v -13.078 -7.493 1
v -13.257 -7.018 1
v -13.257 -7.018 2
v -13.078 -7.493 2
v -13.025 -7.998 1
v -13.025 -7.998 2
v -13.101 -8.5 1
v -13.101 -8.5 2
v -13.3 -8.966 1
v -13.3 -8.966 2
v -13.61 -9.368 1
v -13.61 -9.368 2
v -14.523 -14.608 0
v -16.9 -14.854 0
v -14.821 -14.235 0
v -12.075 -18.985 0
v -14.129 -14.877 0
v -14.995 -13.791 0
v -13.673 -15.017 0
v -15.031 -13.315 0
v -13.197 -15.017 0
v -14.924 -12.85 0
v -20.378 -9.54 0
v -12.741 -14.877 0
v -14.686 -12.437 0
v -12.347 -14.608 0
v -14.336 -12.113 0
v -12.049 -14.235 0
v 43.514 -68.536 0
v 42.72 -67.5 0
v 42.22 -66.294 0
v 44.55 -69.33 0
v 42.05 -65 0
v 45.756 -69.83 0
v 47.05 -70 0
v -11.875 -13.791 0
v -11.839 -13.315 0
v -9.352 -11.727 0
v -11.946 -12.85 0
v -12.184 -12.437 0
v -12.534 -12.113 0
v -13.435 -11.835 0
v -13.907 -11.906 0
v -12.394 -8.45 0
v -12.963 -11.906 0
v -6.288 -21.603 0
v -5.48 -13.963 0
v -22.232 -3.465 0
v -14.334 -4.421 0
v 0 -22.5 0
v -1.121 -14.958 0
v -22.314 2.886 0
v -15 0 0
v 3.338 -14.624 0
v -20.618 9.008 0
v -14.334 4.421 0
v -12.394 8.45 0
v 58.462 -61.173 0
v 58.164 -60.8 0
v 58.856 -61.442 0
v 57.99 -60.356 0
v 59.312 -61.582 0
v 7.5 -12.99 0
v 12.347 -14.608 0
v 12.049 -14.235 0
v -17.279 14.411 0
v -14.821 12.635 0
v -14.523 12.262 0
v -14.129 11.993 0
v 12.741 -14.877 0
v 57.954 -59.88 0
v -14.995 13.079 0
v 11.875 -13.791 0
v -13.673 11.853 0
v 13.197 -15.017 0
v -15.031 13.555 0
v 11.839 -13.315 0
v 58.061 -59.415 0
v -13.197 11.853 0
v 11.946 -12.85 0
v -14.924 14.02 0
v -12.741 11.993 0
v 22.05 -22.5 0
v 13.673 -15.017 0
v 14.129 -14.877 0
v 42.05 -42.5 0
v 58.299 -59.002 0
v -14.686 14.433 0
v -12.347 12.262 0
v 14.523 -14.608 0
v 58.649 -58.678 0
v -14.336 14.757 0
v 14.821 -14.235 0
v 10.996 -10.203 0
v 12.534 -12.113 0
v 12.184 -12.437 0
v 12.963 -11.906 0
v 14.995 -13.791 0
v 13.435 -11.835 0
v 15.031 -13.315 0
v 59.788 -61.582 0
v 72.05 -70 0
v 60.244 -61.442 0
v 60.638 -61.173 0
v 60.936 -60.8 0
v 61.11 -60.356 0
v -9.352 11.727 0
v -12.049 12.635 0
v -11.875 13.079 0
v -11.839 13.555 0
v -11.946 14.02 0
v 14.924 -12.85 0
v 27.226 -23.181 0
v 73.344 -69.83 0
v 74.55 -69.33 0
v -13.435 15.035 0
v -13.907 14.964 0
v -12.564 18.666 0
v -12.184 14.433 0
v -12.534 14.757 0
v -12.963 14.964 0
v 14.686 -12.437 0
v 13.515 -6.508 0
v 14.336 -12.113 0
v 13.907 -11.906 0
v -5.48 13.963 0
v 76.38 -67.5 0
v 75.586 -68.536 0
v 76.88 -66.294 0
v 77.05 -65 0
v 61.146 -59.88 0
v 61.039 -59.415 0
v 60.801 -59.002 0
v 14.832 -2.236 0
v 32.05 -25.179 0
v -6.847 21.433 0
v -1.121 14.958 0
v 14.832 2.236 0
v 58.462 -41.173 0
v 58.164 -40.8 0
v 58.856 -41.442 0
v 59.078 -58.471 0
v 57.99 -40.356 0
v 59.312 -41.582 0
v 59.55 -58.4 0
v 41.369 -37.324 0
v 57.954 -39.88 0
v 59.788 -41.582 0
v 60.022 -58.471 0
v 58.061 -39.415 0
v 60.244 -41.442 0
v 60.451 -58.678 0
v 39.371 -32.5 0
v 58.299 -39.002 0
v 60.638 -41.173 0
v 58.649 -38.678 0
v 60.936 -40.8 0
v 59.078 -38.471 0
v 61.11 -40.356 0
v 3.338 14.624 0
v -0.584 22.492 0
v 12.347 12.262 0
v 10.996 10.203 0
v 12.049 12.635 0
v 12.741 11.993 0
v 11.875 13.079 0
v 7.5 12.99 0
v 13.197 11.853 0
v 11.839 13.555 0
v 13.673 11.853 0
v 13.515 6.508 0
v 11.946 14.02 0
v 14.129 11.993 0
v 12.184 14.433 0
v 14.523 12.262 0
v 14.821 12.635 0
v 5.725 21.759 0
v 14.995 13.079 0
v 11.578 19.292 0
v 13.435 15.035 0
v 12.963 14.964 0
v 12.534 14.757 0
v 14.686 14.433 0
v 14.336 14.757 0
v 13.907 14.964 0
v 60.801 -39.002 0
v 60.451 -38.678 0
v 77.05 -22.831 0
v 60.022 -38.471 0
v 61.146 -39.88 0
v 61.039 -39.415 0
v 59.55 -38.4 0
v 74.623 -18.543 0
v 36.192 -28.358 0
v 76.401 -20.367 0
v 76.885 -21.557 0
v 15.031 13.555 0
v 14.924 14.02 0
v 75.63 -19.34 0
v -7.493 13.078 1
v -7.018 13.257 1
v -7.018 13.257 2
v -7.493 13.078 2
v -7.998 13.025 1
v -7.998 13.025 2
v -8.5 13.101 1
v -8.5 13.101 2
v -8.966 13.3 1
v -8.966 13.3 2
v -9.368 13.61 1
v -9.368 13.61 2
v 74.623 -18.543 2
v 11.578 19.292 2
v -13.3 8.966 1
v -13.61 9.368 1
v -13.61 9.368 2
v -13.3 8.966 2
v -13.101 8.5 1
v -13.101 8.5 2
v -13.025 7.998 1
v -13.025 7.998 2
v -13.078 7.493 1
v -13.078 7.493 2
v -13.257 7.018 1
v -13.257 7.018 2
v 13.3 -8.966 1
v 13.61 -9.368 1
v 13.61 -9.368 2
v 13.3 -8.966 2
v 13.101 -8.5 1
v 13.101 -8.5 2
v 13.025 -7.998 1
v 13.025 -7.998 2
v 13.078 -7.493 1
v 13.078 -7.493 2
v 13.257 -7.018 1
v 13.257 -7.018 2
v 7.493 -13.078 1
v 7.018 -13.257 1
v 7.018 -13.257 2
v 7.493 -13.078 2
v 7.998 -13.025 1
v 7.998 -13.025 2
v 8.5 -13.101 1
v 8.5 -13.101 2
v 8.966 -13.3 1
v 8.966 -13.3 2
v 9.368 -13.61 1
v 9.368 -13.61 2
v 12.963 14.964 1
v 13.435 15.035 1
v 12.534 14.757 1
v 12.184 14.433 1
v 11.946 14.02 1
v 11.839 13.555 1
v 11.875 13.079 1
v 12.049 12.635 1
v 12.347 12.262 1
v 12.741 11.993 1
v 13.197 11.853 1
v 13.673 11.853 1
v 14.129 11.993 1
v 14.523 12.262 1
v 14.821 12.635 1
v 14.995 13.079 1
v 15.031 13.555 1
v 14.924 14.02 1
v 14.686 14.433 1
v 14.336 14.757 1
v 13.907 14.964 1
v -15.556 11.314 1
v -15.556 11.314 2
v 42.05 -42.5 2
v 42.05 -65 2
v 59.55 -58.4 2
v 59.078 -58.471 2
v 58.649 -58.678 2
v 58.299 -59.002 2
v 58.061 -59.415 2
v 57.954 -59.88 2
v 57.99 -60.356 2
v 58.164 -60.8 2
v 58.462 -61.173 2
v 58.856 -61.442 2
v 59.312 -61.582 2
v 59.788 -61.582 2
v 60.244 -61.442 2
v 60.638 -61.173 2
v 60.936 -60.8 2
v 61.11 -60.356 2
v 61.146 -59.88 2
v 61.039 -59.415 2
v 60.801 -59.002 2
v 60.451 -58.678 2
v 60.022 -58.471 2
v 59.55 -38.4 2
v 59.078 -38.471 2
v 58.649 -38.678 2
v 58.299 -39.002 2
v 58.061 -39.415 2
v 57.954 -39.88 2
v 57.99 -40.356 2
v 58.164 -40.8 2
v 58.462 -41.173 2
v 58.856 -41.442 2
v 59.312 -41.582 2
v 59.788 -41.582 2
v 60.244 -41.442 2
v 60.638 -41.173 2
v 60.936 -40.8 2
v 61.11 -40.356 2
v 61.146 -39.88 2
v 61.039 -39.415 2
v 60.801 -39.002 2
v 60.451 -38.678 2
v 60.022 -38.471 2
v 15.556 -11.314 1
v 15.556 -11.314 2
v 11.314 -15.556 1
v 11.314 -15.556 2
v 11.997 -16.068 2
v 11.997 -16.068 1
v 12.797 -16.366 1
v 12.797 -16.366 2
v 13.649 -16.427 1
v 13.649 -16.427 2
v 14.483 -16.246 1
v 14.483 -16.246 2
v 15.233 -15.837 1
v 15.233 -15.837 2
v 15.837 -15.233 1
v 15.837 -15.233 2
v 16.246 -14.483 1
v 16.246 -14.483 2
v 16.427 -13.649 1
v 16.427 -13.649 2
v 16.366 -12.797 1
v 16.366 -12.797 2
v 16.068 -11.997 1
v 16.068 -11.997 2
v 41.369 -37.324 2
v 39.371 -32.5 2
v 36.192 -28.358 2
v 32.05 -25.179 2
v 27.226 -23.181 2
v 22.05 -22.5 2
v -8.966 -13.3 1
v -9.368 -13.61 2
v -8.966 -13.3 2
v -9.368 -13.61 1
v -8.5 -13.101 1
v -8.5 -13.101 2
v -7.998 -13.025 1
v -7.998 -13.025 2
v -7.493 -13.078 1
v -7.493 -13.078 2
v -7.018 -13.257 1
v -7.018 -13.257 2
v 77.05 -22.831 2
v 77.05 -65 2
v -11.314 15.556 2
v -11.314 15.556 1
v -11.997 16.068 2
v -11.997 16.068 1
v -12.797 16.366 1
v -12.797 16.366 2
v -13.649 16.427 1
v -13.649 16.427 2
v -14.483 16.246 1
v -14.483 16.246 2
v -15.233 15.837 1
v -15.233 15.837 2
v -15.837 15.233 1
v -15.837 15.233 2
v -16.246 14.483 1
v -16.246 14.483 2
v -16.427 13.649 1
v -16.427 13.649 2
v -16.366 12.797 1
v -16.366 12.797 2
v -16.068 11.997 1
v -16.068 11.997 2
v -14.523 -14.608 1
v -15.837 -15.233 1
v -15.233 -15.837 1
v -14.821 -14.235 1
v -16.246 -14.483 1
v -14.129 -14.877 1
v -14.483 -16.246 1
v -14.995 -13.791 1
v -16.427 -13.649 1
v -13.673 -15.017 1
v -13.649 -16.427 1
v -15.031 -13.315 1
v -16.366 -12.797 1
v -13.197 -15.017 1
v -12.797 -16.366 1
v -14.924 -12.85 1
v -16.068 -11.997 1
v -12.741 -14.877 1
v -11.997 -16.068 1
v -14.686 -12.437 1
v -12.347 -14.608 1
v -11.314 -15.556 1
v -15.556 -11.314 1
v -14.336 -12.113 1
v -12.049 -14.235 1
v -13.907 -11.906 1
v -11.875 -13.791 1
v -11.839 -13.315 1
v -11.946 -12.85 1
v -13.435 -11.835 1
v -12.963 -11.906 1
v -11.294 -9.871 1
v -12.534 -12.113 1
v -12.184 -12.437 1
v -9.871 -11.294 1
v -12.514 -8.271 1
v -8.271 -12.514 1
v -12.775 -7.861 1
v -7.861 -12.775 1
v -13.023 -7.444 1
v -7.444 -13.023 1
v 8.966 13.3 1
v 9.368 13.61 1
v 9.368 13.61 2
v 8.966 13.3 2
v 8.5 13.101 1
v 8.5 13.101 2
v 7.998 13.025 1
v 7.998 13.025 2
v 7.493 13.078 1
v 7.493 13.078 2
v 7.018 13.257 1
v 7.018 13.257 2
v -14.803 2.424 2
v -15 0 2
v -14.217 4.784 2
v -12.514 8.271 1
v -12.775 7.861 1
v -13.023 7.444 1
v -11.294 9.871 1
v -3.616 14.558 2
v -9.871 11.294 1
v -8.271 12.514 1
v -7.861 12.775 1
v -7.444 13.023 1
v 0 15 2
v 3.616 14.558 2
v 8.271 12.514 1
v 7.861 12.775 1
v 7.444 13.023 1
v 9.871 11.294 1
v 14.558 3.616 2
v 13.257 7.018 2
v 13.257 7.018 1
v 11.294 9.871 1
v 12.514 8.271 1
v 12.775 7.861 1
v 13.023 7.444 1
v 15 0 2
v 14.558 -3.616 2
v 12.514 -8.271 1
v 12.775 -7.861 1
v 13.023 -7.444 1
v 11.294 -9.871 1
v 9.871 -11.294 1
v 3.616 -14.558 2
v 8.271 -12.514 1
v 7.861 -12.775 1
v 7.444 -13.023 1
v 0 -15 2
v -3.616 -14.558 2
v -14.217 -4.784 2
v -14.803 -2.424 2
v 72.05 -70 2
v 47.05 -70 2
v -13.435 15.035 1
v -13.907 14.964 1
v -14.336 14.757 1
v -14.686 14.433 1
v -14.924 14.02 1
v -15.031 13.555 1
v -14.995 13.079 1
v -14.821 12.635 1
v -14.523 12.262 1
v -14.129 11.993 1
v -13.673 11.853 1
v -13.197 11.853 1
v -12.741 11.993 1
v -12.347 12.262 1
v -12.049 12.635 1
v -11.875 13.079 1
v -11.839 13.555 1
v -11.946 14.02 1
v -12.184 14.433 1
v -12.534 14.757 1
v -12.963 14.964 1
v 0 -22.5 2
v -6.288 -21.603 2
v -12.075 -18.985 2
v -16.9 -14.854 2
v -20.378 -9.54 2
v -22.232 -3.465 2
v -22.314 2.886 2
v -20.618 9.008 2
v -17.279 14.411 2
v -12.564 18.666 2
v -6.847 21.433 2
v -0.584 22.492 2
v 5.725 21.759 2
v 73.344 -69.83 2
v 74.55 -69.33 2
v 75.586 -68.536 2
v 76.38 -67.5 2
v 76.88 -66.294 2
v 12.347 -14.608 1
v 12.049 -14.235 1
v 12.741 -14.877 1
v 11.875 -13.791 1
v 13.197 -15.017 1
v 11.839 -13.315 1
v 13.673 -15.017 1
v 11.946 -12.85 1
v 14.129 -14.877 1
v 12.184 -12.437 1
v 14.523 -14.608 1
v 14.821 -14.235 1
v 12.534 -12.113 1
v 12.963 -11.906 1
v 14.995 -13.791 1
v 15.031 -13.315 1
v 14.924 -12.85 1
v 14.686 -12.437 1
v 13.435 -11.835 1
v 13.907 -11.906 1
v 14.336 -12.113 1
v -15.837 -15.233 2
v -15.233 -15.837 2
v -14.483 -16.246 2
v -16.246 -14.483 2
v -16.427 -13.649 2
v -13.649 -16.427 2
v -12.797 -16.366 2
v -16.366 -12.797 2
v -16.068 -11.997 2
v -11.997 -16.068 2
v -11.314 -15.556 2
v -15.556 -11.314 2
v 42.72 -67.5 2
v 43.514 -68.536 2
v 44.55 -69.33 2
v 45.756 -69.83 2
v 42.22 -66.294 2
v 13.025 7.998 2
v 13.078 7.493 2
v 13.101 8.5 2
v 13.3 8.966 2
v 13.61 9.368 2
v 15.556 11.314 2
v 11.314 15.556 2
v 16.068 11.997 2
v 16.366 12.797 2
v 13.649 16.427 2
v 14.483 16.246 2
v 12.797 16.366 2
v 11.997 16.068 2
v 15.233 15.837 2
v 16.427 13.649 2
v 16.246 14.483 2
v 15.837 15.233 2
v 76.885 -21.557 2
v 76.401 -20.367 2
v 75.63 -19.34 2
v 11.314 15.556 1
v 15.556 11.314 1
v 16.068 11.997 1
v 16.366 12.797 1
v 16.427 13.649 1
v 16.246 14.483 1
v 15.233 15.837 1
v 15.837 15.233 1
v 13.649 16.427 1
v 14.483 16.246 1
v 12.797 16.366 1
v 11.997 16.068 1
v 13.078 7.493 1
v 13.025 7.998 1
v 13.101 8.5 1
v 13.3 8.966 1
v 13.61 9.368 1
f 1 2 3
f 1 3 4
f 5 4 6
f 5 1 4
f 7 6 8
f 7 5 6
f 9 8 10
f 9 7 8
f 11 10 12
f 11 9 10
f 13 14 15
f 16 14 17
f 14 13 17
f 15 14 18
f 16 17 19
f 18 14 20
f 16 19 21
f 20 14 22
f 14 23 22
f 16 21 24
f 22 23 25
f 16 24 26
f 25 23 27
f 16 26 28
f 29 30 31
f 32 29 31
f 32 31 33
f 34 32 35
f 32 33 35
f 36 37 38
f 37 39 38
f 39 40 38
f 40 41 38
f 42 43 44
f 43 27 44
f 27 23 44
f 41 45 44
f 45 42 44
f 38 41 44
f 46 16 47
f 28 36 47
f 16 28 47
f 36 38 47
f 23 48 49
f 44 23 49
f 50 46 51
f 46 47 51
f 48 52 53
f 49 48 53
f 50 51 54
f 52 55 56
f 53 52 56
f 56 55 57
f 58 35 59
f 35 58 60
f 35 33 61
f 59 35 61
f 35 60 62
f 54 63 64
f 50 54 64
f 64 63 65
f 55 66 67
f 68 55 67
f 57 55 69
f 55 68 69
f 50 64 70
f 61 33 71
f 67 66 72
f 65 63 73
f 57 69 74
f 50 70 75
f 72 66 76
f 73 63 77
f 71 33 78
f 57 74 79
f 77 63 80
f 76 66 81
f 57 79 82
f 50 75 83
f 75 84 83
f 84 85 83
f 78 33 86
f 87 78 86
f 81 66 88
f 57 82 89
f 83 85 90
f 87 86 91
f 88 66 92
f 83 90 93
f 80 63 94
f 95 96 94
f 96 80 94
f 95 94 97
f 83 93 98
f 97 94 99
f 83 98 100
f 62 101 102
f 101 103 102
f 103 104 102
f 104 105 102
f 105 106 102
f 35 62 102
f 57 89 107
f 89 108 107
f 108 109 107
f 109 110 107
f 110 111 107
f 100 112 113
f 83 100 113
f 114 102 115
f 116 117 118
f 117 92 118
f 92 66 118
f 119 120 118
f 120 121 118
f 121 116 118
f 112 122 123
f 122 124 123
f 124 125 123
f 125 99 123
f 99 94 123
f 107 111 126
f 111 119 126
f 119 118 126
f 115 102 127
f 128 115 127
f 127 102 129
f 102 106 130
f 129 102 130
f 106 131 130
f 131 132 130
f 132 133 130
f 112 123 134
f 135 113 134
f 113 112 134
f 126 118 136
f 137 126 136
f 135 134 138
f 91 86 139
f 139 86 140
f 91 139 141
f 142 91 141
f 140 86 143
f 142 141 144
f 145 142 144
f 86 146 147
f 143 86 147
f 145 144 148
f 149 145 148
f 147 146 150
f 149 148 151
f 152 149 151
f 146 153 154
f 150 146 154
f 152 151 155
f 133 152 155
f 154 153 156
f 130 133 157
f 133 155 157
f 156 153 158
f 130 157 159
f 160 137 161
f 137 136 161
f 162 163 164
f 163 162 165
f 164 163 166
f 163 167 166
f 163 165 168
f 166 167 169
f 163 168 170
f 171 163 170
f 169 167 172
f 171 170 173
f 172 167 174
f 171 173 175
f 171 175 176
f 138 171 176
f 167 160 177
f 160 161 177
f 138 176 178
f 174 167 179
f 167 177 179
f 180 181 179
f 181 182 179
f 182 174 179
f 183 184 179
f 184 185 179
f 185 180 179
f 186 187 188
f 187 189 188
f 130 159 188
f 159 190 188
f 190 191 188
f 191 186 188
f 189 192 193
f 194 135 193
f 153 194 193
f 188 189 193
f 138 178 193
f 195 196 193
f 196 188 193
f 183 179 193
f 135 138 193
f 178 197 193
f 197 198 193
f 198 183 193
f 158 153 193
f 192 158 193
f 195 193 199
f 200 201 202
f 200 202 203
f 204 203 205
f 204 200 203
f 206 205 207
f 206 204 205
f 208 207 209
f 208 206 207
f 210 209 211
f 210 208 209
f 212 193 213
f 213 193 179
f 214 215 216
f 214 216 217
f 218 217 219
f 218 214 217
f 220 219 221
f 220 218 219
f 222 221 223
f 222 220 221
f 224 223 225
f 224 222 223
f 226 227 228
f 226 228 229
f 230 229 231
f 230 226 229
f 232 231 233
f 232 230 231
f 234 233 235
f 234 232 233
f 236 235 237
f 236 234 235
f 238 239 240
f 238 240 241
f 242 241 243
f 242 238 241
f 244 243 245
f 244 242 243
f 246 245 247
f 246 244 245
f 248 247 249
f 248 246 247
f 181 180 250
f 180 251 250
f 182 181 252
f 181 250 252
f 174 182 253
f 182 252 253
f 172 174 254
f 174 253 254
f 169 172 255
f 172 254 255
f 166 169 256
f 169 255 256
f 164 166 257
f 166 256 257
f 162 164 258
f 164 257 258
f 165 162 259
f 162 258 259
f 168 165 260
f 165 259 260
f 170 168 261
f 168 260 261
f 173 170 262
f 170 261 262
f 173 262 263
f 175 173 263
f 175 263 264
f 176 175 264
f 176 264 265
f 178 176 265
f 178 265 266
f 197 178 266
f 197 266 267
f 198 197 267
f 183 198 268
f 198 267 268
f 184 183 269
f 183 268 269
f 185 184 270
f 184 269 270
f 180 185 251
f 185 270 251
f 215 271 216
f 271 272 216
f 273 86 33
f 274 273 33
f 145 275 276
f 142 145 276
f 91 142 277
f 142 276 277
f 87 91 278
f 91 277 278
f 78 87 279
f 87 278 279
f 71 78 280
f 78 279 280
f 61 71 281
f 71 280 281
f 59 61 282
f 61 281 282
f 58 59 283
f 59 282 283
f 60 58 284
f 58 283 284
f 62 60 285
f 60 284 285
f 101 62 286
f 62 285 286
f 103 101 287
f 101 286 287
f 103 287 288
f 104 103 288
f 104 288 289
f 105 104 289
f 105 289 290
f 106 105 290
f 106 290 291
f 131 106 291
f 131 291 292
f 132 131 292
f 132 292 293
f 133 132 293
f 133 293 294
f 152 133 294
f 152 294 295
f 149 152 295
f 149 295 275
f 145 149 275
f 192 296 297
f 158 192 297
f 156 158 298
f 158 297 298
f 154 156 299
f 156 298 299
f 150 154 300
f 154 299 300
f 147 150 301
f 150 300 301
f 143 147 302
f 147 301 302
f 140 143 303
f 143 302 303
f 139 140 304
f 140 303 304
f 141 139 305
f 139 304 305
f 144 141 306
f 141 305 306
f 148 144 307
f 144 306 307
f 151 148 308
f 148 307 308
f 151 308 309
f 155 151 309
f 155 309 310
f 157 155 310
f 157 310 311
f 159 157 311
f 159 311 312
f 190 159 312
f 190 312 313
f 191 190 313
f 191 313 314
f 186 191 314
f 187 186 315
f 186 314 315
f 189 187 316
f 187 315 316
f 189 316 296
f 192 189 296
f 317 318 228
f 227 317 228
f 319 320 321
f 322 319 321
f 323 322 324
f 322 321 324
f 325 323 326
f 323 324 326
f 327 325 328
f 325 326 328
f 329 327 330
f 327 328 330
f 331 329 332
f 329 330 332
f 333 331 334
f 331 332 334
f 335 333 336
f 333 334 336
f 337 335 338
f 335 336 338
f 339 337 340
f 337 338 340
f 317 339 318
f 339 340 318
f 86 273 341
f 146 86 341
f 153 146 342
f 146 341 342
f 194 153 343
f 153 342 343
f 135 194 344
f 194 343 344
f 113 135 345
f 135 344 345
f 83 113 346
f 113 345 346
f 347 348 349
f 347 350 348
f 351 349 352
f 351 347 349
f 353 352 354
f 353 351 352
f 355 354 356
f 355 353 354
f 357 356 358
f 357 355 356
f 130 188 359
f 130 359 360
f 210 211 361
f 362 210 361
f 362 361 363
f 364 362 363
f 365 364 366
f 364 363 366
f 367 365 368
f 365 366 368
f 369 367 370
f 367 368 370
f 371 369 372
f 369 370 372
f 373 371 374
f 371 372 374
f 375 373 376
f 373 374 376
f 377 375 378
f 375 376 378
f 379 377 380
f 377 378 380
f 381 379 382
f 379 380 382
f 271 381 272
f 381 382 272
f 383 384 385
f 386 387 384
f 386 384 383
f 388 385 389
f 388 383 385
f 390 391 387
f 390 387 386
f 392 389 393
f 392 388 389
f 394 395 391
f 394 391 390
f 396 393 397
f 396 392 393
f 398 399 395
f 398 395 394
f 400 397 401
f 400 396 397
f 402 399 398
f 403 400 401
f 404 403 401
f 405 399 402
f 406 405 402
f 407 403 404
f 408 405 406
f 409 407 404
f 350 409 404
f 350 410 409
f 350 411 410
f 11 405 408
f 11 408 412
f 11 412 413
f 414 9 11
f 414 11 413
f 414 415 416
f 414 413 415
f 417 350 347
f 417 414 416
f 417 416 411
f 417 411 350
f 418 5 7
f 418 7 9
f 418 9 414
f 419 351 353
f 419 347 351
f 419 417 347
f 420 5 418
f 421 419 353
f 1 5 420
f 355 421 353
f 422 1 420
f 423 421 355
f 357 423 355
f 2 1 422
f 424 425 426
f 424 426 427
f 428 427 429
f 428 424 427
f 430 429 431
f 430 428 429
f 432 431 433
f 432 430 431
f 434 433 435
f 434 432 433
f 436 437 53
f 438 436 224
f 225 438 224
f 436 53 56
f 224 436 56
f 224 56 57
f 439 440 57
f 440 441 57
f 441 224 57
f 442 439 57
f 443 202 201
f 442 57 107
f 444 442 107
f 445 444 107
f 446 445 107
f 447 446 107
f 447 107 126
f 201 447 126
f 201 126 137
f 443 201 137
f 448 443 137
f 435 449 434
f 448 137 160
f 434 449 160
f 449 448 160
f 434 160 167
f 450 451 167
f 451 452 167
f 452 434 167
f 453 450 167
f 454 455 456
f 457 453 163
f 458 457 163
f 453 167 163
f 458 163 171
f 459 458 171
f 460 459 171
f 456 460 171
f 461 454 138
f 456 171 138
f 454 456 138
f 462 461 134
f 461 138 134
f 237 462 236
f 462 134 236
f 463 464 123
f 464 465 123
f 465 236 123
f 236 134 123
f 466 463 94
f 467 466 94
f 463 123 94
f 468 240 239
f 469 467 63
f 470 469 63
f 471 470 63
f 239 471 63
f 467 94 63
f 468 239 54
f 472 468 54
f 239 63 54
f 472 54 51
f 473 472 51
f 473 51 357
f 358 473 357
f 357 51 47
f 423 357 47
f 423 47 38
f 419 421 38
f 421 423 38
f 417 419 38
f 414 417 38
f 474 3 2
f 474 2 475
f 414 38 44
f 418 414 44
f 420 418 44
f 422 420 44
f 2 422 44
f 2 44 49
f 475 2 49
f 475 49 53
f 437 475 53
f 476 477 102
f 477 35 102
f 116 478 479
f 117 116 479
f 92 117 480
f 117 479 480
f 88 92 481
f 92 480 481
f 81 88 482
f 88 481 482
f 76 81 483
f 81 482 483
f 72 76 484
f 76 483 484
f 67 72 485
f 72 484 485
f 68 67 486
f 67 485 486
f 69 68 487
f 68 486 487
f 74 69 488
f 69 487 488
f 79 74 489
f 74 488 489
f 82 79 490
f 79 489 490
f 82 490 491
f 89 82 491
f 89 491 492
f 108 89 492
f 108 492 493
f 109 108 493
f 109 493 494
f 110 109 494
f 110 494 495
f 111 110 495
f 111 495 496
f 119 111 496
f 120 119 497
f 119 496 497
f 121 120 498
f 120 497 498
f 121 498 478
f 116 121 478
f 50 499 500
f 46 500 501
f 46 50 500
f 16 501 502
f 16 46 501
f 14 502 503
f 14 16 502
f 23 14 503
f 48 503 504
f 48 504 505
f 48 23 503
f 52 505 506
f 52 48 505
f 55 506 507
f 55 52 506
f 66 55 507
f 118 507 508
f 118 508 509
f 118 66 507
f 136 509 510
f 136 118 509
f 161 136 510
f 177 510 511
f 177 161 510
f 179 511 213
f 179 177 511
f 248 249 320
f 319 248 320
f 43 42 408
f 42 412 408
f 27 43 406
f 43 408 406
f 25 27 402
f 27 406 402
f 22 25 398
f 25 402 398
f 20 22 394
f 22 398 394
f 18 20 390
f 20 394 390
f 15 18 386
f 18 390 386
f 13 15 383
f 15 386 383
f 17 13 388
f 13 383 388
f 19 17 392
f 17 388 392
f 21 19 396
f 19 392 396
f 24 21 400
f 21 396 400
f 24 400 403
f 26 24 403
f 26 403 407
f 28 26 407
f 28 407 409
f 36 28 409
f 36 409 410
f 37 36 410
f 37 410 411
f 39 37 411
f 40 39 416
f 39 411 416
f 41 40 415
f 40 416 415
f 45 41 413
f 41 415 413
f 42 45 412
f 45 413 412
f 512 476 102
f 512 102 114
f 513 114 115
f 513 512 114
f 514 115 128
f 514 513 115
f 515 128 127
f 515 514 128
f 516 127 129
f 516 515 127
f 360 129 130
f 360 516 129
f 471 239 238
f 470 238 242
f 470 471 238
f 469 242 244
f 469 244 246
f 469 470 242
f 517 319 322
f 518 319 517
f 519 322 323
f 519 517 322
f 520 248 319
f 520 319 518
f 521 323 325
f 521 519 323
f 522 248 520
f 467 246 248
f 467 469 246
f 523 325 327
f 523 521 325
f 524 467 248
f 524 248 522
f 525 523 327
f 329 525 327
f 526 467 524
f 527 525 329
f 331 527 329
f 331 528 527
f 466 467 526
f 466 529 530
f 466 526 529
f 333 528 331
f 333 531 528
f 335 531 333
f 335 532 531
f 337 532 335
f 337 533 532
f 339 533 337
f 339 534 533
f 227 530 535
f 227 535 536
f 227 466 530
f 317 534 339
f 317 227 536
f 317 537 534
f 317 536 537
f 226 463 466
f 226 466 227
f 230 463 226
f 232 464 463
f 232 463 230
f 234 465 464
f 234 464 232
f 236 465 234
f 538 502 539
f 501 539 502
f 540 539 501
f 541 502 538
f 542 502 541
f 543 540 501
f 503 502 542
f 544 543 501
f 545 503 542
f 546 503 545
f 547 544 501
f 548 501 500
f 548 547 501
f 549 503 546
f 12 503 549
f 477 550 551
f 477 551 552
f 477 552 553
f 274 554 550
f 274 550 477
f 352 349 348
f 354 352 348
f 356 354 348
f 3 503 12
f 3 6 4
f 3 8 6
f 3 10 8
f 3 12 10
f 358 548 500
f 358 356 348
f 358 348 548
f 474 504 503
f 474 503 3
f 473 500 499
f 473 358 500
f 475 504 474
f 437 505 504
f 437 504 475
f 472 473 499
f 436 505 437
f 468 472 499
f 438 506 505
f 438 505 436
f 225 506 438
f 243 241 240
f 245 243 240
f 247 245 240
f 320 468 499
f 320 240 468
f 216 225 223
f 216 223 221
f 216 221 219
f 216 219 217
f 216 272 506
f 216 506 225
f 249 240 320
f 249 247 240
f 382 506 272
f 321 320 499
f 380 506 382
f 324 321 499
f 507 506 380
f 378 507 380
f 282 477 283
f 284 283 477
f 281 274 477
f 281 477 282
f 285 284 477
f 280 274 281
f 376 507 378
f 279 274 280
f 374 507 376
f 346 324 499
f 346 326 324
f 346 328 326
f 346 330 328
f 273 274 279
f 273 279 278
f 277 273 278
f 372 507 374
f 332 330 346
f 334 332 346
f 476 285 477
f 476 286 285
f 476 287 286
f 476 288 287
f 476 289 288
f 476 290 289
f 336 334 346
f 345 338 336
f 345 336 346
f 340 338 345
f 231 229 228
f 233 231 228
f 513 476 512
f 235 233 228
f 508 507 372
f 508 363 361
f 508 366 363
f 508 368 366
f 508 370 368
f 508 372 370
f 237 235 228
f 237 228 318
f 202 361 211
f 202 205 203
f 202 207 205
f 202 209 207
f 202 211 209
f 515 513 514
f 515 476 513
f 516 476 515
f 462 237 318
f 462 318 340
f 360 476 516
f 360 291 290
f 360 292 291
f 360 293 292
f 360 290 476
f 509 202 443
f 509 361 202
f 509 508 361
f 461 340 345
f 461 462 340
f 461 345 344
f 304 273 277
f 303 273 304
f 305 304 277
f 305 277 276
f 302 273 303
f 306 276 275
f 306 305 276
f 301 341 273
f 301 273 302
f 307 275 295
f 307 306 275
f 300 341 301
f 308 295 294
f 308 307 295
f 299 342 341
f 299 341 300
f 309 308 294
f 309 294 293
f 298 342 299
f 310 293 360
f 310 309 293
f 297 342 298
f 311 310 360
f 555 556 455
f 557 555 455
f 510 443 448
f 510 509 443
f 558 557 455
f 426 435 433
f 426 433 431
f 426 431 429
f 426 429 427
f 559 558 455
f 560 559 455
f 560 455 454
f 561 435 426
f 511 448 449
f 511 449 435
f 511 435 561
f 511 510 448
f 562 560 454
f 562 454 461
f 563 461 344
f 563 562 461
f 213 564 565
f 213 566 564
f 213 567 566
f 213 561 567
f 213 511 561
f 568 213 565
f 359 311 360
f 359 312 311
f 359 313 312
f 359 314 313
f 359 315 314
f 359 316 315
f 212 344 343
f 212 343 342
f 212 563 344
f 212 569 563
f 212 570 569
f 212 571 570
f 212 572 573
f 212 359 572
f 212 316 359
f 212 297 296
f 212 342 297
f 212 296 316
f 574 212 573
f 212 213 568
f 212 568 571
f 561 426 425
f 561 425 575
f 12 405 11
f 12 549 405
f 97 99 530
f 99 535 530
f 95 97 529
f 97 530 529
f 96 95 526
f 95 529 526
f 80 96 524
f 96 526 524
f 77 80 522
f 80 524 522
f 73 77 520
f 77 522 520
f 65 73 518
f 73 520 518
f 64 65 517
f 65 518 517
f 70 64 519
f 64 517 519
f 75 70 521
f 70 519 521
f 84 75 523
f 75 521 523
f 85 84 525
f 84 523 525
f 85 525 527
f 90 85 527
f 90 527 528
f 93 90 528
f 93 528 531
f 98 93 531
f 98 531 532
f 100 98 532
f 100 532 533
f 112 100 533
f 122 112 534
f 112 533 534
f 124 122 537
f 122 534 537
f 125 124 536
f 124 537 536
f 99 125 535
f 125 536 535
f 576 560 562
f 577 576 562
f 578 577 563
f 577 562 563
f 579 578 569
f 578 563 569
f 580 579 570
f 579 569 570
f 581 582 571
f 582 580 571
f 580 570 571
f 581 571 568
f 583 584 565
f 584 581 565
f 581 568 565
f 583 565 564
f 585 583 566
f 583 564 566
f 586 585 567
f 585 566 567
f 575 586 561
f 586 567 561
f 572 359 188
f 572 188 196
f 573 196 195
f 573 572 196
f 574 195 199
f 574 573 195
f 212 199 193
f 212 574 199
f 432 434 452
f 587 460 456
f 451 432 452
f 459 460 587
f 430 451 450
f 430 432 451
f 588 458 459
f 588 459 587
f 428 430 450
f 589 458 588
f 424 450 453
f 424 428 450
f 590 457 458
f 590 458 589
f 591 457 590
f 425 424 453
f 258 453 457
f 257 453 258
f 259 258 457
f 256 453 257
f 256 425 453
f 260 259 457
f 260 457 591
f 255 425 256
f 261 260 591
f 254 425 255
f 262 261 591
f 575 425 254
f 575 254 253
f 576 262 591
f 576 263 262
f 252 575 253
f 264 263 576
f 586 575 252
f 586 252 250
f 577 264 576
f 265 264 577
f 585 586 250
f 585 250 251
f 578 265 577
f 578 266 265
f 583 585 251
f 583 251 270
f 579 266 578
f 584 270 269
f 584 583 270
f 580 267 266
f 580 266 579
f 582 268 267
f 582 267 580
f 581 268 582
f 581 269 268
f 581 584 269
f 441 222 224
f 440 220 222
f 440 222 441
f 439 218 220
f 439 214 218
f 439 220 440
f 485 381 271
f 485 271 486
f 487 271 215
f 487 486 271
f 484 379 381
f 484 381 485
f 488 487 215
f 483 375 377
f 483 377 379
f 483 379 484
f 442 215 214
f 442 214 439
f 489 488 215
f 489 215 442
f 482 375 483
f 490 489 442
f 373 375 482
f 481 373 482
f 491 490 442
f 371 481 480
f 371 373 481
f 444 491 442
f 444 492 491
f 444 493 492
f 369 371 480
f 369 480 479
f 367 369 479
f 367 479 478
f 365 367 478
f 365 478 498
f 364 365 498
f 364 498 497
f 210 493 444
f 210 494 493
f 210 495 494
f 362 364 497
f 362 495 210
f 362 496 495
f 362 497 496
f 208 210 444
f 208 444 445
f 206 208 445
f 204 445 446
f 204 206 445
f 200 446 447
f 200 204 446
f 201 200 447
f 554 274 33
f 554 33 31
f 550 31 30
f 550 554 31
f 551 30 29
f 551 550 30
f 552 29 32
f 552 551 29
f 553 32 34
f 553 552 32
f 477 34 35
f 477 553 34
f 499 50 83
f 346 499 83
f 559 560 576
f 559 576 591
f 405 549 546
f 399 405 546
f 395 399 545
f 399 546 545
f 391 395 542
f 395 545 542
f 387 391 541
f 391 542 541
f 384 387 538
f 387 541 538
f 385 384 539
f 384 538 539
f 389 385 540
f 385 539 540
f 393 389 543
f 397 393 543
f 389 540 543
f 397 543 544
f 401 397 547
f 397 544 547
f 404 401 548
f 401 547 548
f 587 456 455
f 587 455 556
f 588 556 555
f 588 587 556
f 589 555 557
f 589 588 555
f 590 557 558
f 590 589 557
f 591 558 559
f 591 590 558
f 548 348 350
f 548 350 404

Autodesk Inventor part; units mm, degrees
ref_plane "YZ Plane" through (0, 0, 0) normal (1, 0, 0) x (0, 1, 0)
ref_plane "XZ Plane" through (0, 0, 0) normal (0, 1, 0) x (-1, 0, 0)
ref_plane "XY Plane" through (0, 0, 0) normal (0, 0, 1) x (1, 0, 0)
sketch "スケッチ1" plane through (0, 0, 0) normal (0, 0, 1) x (1, 0, 0)
  circle A0 centre (0, 0) radius 22.5
  line L0 (0, 0) -> (59.55, 0)
  line L1 (59.55, 0) -> (42.05, 0)
  line L2 (42.05, 0) -> (42.05, -70)
  line L3 (42.05, -70) -> (59.55, -70)
  line L4 (59.55, -70) -> (59.55, 0)
  line L5 (77.05, 0) -> (77.05, -70)
  line L6 (77.05, -70) -> (59.55, -70)
  line L7 (77.05, 0) -> (59.55, 0)
  line L8 (42.05, -70) -> (-15.3485, -16.4522)
  line L9 (77.05, -20) -> (42.05, -20)
  line L10 (77.05, -20) -> (11.5782, 19.2924)
  point P0 (42.05, 0)
  point P1 (22.5, 0)
  dimension "d0" = 45
  dimension "d1" = 59.55
  dimension "d2" = 17.5
  dimension "d3" = 70
  dimension "d31" = 50
extrude "押し出し1" add sketch "スケッチ1" along normal blind 2 contours A0 | L0 L2 L8 A0 | A0 L10 L0 | L0 L10 L4 L9 L2 | L2 L9 L4 L3 | L10 L9 L4 | L4 L9 L5 L6
sketch "スケッチ2" plane through (0, 0, 0) normal (0, 0, -1) x (-1, 0, 0)
  circle A0 centre (0, 0) radius 15
  dimension "d6" = 30
extrude "押し出し2" cut sketch "スケッチ2" against normal blind 2
sketch "スケッチ3" plane through (0, 0, 0) normal (0, 0, -1) x (-1, 0, 0)
  arc A0 (15.3485, -16.4522) -> (-11.5782, 19.2924) centre (0, 0) ccw projected
  circle A1 centre (0, 0) radius 19
  line L0 (0, 0) -> (0, 22.5)
  line L1 (0, 0) -> (13.435, 13.435)
  point P0 (13.435, 13.435)
  point P1 (-13.435, 13.435)
  point P2 (-13.435, -13.435)
  point P3 (13.435, -13.435)
  dimension "d9" = 38
  dimension "d12" = 360
  dimension "d47" = 45
hole "穴1" at (-13.435, 13.435, 0) at (13.435, 13.435, 0) at (13.435, -13.435, 0) at (-13.435, -13.435, 0) direction (0, 0, 1) diameter 3.2 end through all
sketch "スケッチ4" plane through (0, 0, 0) normal (0, 0, -1) x (-1, 0, 0)
  line L0 (-77.05, -70) -> (-77.05, -20) projected
  line L1 (15.3485, -16.4522) -> (-42.05, -70) projected
  line L2 (-42.05, -70) -> (-82.05, -70)
  line L3 (-77.05, -20) -> (-42.05, -20)
  line L4 (-42.05, -20) -> (-42.05, -70)
  line L5 (-42.05, -70) -> (-77.05, -70)
  line L6 (-77.05, -70) -> (-77.05, -20)
  line L7 (-59.55, -20) -> (-59.55, -70)
  point P0 (0, 0)
  point P1 (-59.55, -40)
  point P2 (-59.55, -60)
  dimension "d32" = 20
  dimension "d33" = 20
hole "穴2" at (59.55, -40, 0) at (59.55, -60, 0) direction (0, 0, 1) diameter 3.2 end through all
sketch "スケッチ5" plane through (0, 0, 0) normal (0, 0, -1) x (-1, 0, 0)
  arc A0 (15.3485, -16.4522) -> (-11.5782, 19.2924) centre (0, 0) ccw projected
  circle A1 centre (0, 0) radius 22.5
  line L0 (0, -22.5) -> (-42.05, -22.5)
  line L1 (15.3485, -16.4522) -> (-42.05, -70) projected
  line L2 (-42.05, -22.5) -> (-42.05, -70)
  point P0 (15.3485, -16.4522)
  point P1 (-2.7683, -39.25)
  point P2 (-11.5782, 19.2924)
  point P3 (15.3485, -16.4522)
  dimension "d35" = 45
extrude "押し出し3" cut sketch "スケッチ5" against normal blind 2 contours L1 L2 L0 A1
fillet "フィレット2" radius 20 1 edges at (42.05, -22.5, 1)
fillet "フィレット3" radius 5 3 edges at (42.05, -70, 1) (77.05, -70, 1) (77.05, -20, 1)
sketch "スケッチ7" plane through (0, 0, 2) normal (0, 0, 1) x (1, 0, 0)
  circle A0 centre (-13.435, 13.435) radius 1.6 projected
  circle A1 centre (-13.435, 13.435) radius 3
  circle A2 centre (-13.435, -13.435) radius 3
  circle A3 centre (13.435, -13.435) radius 3
  circle A4 centre (13.435, 13.435) radius 3
  line L0 (-15.5563, -11.3137) -> (11.3137, 15.5563)
  line L1 (15.5563, 11.3137) -> (-11.3137, -15.5563)
  line L2 (-15.5563, 11.3137) -> (11.3137, -15.5563)
  line L3 (15.5563, -11.3137) -> (-11.3137, 15.5563)
  point P0 (0, 0)
  point P1 (-4.2426, 0)
  point P2 (0, -4.2426)
  point P3 (4.2426, 0)
  point P4 (0, 4.2426)
  dimension "d48" = 6
  dimension "d51" = 360
extrude "押し出し5" cut sketch "スケッチ7" against normal blind 1
fillet "フィレット4" radius 2 8 edges at (-8.271, -12.5136, 1.5) (12.5136, 8.271, 1.5) (-12.5136, -8.271, 1.5) (8.271, 12.5136, 1.5) (8.271, -12.5136, 1.5) (-12.5136, 8.271, 1.5) (12.5136, -8.271, 1.5) (-8.271, 12.5136, 1.5)
equation "\"d1\" = Sside"
equation "\"BendRadius\" = Thickness"
equation "\"BendReliefWidth\" = Thickness"
equation "\"BendReliefDepth\" = 0.5 * Thickness"
equation "\"CornerReliefSize\" = 4 * Thickness"
equation "\"MinimumRemnant\" = 2 * Thickness"
equation "\"TransitionRadius\" = BendRadius"
equation "\"JacobiRadiusSize\" = BendRadius"
equation "\"GapSize\" = Thickness"
equation "\"Sside\" = 59.55"
equation "\"Thickness\" = 3.048"
properties part number "upperarm_fixplate2_forR0" material "アルミニウム 6061"
